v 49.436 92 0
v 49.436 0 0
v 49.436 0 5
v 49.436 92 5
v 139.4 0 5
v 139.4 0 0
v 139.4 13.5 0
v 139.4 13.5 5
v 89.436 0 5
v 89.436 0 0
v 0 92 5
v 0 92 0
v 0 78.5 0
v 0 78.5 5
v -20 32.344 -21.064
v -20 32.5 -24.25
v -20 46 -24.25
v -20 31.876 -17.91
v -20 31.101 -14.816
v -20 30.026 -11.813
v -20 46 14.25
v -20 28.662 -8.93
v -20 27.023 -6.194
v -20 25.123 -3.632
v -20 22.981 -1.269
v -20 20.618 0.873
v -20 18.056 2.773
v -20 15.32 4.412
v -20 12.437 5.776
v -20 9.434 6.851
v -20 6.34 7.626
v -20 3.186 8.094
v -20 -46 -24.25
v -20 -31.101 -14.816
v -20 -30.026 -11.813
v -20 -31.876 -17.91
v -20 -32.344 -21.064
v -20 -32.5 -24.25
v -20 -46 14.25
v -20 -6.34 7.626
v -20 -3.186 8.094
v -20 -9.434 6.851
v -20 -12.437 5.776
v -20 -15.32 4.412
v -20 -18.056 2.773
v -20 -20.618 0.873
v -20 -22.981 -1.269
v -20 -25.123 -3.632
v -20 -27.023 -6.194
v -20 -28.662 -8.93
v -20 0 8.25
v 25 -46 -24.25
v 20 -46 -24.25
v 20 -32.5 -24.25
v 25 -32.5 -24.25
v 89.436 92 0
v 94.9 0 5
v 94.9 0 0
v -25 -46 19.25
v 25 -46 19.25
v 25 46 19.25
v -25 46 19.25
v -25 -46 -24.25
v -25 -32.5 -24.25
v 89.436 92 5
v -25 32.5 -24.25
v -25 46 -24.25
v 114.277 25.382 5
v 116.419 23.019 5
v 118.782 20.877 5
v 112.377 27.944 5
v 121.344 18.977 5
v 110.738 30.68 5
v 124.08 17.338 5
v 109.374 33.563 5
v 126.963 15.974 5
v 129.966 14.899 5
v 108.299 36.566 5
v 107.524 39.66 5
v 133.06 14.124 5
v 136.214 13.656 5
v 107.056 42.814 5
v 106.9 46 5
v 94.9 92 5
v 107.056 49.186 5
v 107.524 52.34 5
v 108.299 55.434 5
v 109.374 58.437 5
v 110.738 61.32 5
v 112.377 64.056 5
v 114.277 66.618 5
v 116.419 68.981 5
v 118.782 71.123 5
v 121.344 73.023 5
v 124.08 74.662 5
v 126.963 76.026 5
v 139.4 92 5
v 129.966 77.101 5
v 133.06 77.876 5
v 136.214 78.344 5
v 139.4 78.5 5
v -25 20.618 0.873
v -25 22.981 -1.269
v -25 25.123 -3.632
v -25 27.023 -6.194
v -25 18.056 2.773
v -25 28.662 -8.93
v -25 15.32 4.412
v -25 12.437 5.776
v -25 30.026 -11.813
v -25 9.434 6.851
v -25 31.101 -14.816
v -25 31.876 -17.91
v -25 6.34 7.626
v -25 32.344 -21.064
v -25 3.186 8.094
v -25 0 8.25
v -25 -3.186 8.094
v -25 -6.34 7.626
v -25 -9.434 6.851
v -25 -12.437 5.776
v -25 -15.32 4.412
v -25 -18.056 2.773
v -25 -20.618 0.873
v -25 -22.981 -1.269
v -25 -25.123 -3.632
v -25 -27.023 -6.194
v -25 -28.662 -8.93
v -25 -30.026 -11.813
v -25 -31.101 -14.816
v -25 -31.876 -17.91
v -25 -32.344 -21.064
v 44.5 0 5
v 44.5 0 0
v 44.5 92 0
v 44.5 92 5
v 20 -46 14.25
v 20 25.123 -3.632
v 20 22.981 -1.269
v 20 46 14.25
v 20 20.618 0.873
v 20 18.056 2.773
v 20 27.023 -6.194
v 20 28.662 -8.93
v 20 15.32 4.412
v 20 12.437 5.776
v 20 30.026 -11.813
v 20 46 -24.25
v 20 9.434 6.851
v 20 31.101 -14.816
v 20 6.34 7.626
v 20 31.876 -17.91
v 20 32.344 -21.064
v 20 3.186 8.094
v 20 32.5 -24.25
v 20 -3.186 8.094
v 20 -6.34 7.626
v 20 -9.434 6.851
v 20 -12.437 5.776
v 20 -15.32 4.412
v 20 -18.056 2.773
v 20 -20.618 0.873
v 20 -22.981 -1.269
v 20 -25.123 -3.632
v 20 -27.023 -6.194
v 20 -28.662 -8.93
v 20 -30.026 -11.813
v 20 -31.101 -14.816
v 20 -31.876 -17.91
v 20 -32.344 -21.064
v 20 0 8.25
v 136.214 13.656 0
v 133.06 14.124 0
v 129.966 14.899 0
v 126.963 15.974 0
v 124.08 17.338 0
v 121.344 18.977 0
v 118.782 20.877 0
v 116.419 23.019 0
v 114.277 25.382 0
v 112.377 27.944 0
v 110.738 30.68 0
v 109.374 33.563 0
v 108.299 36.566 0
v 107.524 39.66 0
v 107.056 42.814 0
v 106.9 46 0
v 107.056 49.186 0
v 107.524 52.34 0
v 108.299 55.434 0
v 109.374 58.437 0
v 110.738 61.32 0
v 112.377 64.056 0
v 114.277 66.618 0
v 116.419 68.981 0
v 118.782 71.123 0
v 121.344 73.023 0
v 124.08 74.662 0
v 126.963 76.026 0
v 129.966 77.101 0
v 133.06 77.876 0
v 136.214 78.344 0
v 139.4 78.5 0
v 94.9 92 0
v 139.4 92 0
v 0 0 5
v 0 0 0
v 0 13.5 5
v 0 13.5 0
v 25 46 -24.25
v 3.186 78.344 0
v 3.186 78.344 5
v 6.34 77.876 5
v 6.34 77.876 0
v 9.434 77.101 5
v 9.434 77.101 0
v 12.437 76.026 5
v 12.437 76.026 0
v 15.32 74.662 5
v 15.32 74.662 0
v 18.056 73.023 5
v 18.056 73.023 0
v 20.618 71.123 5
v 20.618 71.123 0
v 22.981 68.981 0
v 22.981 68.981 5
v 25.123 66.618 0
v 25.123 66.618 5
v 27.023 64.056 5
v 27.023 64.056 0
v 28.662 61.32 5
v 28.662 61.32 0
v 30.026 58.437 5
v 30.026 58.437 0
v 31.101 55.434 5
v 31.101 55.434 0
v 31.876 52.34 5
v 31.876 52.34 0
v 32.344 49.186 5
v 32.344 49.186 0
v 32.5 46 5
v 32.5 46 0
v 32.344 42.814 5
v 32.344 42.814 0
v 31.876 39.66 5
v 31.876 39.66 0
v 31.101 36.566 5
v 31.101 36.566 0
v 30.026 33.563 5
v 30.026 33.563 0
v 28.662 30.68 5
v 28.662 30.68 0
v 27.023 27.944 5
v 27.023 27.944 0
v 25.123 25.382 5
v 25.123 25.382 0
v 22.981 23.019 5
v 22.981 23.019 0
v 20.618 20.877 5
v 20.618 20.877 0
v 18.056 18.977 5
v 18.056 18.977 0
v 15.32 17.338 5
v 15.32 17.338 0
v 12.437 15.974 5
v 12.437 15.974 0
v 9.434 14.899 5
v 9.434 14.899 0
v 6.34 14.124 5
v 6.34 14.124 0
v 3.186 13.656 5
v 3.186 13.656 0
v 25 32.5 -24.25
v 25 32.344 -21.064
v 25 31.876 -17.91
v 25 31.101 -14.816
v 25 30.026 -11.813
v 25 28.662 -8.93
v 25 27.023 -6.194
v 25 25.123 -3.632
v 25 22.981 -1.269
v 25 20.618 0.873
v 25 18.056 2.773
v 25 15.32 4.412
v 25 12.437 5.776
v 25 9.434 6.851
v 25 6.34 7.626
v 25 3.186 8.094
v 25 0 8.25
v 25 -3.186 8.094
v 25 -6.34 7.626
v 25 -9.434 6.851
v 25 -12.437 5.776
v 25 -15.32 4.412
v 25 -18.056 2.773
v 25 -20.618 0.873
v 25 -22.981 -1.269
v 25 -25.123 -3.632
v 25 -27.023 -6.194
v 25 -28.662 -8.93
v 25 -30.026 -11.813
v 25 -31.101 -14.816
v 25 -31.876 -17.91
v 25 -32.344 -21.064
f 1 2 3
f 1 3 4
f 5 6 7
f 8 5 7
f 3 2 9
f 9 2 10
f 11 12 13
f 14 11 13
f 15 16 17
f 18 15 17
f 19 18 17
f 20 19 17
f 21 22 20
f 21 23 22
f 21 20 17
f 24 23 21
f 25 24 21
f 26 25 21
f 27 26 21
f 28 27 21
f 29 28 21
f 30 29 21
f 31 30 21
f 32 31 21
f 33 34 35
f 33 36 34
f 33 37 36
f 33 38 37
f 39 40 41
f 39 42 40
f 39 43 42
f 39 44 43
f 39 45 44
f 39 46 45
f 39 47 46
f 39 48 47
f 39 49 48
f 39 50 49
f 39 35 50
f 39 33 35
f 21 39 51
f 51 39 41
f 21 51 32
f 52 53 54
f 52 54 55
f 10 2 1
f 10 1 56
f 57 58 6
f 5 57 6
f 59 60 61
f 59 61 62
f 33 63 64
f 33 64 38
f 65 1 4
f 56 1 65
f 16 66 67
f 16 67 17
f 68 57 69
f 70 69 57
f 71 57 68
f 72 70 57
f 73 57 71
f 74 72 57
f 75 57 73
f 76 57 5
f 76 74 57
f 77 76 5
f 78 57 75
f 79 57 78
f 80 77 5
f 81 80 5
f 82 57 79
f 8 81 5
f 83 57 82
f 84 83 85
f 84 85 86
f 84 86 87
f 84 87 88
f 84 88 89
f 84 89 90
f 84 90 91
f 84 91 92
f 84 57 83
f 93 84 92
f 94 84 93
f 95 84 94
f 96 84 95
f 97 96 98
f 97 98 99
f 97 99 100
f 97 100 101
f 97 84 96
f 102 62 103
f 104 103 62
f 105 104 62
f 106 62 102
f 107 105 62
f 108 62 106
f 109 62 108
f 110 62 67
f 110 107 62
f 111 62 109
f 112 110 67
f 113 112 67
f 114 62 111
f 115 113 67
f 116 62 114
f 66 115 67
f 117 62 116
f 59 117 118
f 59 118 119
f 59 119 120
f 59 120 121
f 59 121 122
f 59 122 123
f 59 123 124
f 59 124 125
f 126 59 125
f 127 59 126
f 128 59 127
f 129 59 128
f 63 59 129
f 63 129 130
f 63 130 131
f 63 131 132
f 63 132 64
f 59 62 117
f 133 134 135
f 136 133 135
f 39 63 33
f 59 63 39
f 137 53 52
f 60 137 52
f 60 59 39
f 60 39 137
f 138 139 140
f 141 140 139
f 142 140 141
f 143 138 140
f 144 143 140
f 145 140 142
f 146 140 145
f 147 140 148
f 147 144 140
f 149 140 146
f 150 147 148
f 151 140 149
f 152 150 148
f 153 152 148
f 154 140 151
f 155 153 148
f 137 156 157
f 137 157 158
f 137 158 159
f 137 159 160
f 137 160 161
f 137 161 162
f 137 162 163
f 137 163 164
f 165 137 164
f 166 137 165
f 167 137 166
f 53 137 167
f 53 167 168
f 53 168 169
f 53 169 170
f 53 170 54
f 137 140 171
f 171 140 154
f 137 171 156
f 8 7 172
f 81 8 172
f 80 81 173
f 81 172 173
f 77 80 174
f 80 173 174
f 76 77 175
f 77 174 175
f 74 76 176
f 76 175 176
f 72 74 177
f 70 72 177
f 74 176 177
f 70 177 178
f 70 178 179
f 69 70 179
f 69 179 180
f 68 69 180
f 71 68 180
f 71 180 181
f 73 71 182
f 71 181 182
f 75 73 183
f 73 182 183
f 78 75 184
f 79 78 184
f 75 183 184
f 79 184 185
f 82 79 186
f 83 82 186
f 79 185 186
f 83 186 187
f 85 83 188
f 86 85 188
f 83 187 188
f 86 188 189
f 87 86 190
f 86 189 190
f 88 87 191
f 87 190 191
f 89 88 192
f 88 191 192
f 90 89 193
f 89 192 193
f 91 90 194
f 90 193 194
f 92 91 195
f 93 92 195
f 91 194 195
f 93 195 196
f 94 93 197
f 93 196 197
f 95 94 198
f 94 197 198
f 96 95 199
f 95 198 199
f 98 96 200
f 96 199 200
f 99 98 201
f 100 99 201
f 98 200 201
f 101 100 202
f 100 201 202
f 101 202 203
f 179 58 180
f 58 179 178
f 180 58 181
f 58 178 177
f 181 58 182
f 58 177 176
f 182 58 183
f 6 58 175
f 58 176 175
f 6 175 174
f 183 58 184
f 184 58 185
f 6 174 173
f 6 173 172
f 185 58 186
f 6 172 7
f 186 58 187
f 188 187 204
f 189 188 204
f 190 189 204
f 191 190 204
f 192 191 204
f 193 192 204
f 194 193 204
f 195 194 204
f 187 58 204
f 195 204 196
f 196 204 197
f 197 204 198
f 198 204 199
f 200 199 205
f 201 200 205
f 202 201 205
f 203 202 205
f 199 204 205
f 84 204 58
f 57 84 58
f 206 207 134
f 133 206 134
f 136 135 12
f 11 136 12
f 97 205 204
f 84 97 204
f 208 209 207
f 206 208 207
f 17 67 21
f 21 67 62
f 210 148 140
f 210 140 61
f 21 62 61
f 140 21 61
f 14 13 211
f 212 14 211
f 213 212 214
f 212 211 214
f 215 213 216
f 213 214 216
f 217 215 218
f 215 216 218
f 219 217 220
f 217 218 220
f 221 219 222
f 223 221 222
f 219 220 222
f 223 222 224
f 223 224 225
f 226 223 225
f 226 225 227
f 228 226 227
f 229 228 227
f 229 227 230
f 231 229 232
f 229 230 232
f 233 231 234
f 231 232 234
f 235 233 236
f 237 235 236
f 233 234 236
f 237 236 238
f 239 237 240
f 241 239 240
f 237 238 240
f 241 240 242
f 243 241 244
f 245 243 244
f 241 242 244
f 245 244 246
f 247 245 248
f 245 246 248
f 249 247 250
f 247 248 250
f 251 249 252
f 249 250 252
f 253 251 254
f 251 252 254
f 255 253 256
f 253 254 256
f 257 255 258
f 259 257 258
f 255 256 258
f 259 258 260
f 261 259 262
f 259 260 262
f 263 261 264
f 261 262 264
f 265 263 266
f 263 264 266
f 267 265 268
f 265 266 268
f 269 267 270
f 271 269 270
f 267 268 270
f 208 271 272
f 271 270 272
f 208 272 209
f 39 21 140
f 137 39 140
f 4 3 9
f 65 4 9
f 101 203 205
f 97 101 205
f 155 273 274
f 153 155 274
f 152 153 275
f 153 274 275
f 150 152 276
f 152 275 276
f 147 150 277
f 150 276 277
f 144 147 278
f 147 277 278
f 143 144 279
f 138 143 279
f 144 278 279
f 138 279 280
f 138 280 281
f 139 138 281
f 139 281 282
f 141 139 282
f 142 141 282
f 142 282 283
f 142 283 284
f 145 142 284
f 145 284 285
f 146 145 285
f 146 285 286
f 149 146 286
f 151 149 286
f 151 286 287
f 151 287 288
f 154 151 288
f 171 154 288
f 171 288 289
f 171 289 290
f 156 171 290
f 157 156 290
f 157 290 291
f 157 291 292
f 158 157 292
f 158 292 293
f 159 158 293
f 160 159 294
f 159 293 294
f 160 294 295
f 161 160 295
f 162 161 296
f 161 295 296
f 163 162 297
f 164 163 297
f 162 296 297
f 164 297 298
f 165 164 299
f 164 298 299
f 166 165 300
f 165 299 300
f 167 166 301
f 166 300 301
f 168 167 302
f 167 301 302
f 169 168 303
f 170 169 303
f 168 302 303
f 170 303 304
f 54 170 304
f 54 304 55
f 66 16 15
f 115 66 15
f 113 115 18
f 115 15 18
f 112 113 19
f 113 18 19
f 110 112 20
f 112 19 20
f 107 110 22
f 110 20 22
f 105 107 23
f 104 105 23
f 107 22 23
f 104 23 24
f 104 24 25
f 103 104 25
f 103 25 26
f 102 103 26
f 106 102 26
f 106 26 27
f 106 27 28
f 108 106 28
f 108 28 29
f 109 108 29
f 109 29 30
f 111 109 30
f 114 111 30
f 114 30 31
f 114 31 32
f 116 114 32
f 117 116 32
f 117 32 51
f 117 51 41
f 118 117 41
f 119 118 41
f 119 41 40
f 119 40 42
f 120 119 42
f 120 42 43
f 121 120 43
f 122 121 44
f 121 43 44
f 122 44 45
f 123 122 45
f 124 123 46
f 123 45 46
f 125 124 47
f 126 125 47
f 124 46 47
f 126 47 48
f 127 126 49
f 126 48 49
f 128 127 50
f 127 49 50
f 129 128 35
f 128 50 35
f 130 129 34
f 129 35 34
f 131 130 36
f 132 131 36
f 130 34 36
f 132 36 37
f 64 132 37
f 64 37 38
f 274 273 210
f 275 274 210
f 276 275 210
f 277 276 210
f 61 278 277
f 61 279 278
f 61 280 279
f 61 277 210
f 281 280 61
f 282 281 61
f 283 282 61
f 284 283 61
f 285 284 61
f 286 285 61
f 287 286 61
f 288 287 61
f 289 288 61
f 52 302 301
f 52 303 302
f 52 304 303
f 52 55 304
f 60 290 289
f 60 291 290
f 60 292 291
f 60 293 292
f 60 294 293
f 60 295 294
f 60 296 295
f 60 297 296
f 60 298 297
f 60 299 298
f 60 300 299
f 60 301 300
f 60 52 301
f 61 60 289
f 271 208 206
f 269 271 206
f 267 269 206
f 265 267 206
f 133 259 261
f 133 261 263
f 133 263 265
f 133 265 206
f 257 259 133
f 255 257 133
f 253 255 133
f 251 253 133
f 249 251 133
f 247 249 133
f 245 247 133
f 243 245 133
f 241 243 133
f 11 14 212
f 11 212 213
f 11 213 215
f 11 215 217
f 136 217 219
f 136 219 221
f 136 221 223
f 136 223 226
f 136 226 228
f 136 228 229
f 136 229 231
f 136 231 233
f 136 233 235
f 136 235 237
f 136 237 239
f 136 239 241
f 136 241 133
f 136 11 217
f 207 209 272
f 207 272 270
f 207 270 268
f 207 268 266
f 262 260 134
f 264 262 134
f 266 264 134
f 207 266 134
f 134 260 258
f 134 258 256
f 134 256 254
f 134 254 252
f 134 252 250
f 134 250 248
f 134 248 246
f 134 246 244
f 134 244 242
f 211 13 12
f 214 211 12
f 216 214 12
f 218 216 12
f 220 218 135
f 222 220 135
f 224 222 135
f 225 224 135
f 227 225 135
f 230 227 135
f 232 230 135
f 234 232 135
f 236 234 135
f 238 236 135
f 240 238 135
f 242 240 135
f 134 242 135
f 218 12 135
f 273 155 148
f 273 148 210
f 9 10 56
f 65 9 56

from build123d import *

# Parameters (mm, degrees)
F1_DEPTH = 46
F3_DEPTH = 54
F4_W     = 40
F4_H     = 92
F5_DEPTH = 5


with BuildPart() as f1:
    # F0 (on Front) → F1 (new body, symmetric)
    with BuildSketch(Plane.XZ):
        Polygon((25, -24.25), (25, 19.25), (-25, 19.25), (-25, -24.25), (-20, -24.25), (-20, 14.25), (20, 14.25), (20, -24.25), align=None)
    extrude(amount=F1_DEPTH, both=True)

    # F2 (on face) → F3 (cut)
    with BuildSketch(Plane.YZ.offset(25)):
        with BuildLine():
            Line((-32.5, -24.25), (32.5, -24.25))
            ThreePointArc((32.5, -24.25), (0, 8.25), (-32.5, -24.25))
        make_face()
    extrude(amount=-F3_DEPTH, mode=Mode.SUBTRACT)


with BuildPart() as f5:
    # F4 (on Top) → F5 (new body)
    with BuildSketch(Plane.XY):
        with BuildLine():
            Line((0, 13.5), (0, 0))
            Line((0, 0), (44.5, 0))
            Line((44.5, 0), (44.5, 92))
            Line((44.5, 92), (0, 92))
            Line((0, 92), (0, 78.5))
            ThreePointArc((0, 78.5), (32.5, 46), (0, 13.5))
        make_face()
        with BuildLine():
            Line((94.9, 0), (139.4, 0))
            Line((139.4, 0), (139.4, 13.5))
            ThreePointArc((139.4, 13.5), (106.9, 46), (139.4, 78.5))
            Line((139.4, 78.5), (139.4, 92))
            Line((139.4, 92), (94.9, 92))
            Line((94.9, 92), (94.9, 0))
        make_face()
        with Locations((69.43582, 46)):
            Rectangle(F4_W, F4_H)
    extrude(amount=F5_DEPTH)


solid = Compound([f1.part, f5.part])
